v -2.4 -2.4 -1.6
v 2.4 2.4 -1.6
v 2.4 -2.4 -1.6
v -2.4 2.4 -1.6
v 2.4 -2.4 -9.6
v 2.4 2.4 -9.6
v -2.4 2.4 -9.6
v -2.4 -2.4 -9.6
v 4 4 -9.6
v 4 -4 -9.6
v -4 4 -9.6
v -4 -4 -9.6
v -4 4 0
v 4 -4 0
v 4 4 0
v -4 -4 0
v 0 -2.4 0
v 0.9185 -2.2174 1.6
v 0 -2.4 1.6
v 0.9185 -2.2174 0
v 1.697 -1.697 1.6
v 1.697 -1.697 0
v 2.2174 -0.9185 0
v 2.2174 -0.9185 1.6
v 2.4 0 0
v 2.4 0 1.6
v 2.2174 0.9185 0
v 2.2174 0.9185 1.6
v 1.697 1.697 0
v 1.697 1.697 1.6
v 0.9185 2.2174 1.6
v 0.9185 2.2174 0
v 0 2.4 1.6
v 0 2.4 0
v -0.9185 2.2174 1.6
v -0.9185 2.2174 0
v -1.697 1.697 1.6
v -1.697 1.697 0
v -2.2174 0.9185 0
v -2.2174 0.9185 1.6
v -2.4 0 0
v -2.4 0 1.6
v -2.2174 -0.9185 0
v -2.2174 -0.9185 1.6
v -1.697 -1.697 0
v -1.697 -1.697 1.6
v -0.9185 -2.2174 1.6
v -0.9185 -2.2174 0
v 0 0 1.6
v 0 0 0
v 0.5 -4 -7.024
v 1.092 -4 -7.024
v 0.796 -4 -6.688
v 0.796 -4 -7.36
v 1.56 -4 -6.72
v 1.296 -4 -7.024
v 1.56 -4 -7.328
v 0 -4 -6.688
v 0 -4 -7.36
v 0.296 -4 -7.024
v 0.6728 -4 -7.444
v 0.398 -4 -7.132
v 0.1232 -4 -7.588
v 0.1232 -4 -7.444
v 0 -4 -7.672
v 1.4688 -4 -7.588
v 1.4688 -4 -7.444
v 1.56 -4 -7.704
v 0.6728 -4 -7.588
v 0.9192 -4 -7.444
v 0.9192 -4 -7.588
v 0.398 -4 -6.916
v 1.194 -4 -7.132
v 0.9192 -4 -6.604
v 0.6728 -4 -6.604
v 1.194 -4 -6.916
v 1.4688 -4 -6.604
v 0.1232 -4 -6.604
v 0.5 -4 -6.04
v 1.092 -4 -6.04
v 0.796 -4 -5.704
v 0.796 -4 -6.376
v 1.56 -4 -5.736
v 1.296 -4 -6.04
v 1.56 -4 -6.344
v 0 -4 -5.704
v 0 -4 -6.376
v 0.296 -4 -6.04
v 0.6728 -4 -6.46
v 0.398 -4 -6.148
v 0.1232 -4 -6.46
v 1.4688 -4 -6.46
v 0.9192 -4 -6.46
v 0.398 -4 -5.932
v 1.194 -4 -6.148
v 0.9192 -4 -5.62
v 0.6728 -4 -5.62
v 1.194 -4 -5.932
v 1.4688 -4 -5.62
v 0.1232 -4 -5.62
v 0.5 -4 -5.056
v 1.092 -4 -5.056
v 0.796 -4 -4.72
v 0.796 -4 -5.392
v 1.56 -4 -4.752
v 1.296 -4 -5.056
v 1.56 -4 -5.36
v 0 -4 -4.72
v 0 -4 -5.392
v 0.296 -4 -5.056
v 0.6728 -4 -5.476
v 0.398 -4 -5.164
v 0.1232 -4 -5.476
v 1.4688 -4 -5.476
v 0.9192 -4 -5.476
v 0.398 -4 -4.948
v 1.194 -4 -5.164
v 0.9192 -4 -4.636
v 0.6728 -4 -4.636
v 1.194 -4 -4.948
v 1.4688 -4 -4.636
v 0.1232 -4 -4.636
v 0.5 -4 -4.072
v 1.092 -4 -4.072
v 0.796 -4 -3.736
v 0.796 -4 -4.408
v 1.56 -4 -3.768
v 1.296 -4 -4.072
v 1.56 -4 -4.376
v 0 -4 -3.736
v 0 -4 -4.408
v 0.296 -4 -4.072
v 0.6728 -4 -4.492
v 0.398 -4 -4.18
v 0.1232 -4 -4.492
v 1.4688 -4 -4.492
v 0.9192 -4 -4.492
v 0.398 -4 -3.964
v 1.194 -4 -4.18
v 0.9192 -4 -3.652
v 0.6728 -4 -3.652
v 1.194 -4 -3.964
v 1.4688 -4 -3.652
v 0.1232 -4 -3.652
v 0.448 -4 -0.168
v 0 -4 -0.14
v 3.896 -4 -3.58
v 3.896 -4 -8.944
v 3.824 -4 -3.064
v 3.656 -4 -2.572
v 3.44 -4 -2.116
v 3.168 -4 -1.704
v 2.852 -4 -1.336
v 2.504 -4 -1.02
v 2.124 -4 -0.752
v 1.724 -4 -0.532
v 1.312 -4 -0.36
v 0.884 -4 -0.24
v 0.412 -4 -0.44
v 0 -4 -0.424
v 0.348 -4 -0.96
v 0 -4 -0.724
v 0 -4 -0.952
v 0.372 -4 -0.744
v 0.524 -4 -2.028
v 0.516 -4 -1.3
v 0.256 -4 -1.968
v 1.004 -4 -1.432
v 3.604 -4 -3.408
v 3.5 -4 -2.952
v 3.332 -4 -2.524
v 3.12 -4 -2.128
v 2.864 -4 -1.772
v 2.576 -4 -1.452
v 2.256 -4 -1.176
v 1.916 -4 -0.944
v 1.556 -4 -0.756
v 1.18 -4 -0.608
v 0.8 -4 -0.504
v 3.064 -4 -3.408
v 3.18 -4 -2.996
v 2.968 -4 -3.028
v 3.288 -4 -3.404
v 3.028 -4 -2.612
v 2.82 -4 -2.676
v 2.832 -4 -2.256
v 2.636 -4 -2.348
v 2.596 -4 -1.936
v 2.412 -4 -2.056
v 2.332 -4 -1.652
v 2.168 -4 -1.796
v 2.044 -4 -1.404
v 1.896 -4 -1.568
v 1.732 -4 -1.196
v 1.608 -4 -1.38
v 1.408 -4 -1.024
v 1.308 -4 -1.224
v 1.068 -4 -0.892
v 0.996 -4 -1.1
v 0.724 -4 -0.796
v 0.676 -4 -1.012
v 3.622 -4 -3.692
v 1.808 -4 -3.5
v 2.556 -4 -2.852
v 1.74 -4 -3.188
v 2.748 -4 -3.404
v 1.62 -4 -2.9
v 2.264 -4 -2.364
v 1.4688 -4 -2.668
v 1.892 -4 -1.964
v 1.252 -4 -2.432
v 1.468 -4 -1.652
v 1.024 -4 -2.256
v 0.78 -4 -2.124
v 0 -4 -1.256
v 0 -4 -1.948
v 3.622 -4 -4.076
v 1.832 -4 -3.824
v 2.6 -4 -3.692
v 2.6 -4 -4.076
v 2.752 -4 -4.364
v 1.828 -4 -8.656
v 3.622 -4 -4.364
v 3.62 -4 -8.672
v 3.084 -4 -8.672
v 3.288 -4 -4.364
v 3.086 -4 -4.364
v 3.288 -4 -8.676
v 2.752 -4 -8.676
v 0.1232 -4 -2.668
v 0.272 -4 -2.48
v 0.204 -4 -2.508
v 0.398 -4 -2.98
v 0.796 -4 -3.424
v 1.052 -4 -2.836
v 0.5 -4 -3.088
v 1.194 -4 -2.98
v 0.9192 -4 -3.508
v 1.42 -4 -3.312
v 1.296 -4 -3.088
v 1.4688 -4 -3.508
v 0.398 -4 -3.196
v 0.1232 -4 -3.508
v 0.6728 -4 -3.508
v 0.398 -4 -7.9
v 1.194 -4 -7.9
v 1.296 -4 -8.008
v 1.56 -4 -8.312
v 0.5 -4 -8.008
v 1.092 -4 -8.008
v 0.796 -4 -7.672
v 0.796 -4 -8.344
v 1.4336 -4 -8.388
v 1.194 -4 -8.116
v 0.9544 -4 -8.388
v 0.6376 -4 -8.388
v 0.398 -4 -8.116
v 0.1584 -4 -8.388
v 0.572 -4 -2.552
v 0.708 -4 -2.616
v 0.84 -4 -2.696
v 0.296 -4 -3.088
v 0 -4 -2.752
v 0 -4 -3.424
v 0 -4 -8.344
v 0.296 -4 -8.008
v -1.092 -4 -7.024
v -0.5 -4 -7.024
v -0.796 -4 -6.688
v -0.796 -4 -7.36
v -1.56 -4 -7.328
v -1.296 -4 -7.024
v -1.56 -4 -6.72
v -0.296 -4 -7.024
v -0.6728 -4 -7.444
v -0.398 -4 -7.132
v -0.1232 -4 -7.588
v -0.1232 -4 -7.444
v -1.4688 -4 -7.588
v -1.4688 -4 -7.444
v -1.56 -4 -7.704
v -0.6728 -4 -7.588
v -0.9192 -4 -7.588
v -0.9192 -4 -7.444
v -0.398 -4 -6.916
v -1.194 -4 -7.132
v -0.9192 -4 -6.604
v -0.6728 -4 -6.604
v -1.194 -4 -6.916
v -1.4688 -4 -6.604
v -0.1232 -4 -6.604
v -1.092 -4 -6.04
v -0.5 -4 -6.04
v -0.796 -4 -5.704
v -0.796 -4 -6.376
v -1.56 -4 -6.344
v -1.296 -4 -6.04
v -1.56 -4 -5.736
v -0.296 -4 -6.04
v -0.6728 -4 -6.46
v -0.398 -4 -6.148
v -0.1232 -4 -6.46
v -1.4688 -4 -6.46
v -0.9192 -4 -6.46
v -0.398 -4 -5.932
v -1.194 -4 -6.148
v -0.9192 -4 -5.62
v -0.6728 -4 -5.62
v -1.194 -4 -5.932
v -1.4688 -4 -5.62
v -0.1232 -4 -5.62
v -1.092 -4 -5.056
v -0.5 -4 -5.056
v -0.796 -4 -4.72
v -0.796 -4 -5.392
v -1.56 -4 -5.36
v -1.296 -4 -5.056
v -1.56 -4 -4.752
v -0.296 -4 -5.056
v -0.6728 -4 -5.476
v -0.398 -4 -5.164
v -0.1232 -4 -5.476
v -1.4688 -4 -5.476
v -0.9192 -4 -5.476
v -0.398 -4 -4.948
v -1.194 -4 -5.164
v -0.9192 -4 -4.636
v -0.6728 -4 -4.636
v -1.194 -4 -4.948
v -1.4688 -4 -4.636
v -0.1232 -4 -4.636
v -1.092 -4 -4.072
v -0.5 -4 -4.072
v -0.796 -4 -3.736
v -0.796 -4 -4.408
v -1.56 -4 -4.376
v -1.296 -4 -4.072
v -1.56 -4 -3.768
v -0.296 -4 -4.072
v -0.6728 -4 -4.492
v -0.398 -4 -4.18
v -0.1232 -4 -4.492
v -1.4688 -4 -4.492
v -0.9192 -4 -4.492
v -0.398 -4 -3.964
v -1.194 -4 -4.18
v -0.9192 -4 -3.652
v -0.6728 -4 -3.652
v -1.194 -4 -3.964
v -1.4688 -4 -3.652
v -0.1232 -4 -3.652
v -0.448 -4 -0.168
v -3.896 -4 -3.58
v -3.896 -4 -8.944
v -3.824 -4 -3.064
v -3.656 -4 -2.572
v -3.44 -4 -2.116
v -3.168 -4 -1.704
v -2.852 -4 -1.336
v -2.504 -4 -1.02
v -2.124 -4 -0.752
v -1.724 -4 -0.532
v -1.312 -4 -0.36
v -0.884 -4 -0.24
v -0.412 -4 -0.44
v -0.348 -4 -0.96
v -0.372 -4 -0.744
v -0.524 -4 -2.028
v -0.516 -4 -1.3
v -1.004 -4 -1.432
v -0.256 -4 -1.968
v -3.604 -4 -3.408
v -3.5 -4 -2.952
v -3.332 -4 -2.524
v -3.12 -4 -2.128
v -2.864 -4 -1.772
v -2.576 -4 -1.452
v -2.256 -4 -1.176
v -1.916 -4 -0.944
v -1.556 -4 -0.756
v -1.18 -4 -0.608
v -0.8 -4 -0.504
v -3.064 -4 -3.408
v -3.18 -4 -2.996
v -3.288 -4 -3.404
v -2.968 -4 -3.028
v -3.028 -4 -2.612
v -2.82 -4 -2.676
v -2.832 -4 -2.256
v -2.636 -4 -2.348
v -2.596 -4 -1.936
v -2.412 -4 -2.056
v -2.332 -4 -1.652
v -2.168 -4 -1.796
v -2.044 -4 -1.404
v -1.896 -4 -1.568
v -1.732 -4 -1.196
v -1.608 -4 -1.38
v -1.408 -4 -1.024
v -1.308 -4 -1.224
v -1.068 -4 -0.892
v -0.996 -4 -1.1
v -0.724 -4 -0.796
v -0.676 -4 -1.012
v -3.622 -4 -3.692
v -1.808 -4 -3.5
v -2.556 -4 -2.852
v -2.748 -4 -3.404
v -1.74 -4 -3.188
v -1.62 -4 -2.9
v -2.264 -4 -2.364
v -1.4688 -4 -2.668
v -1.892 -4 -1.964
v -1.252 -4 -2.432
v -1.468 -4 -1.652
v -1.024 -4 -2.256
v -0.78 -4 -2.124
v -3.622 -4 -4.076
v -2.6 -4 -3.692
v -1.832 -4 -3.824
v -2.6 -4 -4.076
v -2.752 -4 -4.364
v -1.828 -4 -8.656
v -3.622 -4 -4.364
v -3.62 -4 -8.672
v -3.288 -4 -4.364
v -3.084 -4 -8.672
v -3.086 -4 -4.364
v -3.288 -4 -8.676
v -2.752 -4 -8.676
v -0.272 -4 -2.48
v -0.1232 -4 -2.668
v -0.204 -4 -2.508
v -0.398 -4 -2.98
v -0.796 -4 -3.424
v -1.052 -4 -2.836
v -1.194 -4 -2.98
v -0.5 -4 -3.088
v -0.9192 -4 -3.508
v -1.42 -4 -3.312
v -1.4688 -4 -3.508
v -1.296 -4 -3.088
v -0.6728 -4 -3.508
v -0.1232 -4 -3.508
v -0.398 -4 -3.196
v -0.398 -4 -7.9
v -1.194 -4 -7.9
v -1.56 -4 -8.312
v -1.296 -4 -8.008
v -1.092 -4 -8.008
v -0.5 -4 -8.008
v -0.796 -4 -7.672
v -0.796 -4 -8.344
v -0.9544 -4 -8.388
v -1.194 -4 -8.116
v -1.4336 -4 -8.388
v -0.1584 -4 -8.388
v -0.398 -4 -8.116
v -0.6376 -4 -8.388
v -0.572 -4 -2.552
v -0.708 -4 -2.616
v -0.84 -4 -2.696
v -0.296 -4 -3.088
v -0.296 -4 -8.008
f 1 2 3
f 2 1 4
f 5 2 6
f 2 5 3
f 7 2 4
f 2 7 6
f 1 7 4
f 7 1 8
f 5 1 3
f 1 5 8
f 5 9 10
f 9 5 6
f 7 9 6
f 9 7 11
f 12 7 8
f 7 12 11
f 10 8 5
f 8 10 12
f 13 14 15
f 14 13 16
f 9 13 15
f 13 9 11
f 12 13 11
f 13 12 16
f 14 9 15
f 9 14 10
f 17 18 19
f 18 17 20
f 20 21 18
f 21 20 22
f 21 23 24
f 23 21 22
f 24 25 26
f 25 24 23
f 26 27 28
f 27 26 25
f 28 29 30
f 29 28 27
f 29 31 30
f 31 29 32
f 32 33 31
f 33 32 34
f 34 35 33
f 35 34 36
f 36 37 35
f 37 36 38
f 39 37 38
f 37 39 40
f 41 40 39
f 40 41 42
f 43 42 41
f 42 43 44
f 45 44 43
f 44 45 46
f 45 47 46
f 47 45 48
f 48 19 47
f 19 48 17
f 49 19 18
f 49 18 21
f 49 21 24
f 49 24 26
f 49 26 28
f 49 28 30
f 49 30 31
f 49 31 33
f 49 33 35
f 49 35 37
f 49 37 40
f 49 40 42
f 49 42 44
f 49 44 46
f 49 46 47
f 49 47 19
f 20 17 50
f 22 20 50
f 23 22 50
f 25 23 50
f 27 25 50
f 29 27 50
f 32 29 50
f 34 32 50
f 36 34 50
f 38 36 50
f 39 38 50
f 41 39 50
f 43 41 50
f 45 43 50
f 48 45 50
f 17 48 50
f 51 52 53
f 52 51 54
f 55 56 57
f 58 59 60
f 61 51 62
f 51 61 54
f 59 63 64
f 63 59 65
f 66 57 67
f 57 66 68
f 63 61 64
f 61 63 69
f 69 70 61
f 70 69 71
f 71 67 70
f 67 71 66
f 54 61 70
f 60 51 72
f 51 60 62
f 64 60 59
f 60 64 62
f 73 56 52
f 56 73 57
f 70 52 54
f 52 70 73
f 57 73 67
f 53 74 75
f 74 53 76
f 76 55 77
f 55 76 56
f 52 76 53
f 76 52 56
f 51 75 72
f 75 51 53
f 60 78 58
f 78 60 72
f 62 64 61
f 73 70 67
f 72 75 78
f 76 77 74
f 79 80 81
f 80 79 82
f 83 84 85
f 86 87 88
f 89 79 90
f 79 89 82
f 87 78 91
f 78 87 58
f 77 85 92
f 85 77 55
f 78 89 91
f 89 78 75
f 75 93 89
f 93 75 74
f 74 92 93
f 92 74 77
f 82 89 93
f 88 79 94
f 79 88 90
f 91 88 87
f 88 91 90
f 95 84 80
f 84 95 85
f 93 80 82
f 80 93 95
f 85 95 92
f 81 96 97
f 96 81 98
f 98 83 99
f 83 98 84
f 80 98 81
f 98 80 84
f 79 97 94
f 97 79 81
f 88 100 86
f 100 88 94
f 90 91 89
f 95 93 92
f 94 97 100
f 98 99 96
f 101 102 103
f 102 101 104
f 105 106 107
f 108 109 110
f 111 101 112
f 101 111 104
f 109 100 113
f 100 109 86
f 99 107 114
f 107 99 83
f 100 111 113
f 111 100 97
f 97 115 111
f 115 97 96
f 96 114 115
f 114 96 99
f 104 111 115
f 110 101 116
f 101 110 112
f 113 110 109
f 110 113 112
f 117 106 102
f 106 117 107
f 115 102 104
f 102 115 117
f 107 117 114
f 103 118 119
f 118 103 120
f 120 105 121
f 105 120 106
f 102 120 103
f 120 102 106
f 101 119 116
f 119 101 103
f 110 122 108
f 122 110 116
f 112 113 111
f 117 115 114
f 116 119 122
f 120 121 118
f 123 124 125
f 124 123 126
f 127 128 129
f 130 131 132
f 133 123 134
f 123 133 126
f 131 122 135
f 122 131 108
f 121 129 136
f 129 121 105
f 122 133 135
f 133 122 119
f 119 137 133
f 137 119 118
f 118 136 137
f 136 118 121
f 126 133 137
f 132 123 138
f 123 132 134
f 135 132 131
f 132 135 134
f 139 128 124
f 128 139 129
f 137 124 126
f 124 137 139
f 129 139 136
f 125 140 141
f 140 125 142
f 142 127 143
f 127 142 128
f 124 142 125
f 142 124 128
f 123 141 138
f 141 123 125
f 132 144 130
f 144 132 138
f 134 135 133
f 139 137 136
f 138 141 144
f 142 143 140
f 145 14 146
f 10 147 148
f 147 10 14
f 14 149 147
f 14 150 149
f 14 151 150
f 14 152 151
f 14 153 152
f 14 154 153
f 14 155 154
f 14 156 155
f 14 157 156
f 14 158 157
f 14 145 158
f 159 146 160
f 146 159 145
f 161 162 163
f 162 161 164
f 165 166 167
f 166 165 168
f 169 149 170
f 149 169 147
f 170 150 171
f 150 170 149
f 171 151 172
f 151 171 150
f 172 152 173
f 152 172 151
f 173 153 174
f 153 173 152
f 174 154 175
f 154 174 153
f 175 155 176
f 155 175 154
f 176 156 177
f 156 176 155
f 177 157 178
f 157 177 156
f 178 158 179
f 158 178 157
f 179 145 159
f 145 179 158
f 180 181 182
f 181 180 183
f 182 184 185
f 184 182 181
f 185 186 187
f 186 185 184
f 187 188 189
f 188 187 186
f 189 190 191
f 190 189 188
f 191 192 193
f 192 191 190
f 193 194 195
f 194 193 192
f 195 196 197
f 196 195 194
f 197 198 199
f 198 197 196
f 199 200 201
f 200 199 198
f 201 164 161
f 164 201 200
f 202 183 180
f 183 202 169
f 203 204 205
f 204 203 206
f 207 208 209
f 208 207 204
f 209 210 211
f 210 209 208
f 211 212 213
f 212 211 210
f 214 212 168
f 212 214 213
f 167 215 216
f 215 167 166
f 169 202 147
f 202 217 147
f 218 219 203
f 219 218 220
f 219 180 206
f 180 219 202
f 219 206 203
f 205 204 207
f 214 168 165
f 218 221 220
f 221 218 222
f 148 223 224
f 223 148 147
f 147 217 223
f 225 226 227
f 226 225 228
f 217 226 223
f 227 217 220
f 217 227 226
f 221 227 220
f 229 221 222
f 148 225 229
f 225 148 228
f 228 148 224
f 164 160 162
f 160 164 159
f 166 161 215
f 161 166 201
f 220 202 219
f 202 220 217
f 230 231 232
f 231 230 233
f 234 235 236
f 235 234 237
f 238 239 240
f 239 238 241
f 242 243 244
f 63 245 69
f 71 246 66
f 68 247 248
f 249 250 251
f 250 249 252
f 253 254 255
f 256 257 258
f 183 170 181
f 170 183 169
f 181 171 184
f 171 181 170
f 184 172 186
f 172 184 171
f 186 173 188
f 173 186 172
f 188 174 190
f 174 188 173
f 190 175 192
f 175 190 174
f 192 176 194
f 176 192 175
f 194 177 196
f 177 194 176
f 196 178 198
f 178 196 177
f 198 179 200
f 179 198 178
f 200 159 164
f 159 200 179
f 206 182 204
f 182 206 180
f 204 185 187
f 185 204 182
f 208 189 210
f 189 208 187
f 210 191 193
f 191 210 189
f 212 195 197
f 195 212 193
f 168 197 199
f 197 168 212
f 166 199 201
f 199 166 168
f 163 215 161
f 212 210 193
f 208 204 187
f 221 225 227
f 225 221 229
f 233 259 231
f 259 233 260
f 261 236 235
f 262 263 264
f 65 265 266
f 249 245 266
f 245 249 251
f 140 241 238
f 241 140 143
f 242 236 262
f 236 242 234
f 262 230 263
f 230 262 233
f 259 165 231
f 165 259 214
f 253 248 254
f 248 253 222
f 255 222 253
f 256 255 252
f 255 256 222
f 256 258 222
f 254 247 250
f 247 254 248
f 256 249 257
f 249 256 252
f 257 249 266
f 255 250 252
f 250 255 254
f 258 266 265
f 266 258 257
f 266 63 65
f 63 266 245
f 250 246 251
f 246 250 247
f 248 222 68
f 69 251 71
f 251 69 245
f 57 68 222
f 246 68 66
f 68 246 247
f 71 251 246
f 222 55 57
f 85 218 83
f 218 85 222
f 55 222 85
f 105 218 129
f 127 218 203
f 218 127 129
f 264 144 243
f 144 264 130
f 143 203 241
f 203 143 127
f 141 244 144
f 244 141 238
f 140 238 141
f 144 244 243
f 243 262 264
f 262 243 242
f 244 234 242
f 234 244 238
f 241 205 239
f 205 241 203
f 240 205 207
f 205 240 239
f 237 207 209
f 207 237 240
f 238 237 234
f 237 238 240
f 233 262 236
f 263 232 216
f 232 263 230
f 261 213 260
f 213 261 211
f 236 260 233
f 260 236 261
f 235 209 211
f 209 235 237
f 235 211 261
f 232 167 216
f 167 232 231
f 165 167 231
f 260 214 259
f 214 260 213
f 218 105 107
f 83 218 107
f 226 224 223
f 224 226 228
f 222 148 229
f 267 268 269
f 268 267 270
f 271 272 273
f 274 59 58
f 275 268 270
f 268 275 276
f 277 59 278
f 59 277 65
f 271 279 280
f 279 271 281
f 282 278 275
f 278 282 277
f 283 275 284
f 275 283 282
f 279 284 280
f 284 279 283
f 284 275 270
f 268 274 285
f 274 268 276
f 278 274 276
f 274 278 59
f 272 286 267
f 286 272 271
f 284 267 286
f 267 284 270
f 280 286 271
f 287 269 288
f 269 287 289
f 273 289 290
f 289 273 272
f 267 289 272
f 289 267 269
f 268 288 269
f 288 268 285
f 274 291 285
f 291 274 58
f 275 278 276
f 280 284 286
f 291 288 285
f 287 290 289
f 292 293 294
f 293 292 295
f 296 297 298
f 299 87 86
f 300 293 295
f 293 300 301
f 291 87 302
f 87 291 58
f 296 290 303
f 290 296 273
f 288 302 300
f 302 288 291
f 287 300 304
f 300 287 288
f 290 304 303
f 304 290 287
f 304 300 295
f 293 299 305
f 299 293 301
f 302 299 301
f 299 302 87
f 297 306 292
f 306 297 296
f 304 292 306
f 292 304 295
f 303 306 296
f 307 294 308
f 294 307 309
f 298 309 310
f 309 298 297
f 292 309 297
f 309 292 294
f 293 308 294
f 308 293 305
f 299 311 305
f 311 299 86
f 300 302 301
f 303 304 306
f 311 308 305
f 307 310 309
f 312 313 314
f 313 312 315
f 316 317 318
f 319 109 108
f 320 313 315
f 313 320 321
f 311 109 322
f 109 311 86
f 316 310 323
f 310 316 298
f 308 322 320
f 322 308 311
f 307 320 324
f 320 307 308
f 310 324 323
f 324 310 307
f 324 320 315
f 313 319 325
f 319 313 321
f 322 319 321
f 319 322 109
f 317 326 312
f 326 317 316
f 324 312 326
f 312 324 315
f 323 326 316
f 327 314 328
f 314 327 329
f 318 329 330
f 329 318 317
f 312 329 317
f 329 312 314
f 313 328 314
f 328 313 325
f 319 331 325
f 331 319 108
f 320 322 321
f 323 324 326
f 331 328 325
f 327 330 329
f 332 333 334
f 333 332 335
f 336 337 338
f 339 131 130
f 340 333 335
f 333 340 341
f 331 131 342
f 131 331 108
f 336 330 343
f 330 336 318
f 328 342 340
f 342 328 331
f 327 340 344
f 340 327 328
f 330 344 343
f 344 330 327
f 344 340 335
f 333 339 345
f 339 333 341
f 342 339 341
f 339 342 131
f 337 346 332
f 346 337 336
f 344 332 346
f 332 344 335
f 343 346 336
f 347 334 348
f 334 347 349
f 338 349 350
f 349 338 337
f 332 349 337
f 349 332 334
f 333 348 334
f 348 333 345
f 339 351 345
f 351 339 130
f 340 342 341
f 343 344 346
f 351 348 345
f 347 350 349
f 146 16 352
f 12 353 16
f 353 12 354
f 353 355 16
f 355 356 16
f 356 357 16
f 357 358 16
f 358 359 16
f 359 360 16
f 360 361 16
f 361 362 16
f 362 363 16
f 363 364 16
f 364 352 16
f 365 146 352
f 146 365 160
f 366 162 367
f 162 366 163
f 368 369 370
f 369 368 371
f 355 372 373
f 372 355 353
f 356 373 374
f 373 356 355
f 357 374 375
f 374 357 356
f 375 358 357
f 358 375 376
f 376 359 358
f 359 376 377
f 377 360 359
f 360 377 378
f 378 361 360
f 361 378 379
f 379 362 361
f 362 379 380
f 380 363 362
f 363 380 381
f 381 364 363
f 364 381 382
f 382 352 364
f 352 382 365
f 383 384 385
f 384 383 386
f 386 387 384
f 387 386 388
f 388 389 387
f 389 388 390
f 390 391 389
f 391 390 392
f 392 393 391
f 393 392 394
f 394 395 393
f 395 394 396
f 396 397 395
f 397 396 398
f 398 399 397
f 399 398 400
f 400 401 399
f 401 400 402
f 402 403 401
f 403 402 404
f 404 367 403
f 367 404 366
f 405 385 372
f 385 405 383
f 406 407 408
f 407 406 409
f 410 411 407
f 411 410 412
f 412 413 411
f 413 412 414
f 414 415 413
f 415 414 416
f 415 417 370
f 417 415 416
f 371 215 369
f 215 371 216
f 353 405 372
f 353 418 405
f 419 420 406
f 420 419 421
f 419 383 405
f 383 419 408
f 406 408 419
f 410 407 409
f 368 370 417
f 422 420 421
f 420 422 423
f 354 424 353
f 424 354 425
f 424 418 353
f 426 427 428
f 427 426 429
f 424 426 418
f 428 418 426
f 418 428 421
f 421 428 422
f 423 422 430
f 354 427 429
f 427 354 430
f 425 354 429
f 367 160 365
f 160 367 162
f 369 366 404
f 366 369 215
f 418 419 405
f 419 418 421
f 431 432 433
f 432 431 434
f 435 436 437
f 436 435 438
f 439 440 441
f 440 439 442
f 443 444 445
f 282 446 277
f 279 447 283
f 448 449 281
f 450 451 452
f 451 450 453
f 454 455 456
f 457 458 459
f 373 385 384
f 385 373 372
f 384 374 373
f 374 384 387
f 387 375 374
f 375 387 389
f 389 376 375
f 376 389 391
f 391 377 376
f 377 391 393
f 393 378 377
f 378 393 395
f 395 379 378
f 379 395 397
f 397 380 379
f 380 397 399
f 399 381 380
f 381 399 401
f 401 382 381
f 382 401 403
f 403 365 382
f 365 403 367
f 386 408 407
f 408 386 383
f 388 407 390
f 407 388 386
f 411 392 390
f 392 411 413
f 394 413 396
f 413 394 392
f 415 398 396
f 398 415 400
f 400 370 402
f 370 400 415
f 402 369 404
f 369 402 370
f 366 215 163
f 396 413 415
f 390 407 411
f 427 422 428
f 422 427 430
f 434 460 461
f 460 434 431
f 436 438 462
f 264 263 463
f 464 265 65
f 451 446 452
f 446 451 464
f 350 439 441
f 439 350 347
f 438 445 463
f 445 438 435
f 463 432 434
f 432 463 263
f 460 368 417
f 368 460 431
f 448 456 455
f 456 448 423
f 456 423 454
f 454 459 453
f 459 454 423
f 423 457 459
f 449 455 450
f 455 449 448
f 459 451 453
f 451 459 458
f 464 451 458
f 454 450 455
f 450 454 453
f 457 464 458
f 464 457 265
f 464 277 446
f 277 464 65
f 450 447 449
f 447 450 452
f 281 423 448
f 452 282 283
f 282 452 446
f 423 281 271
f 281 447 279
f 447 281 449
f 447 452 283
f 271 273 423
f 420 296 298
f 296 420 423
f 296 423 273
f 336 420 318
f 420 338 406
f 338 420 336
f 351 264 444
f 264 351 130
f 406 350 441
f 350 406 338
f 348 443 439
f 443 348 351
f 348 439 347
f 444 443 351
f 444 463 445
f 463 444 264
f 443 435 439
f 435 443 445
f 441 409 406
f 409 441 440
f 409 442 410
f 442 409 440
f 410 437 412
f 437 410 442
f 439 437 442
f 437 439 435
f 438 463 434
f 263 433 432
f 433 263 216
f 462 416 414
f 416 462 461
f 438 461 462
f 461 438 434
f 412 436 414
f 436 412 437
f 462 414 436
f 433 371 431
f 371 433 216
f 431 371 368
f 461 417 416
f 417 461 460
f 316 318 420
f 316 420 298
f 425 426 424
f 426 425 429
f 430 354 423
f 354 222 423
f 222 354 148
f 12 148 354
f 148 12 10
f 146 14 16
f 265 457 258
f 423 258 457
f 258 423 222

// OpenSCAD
// file: ../p/4-4edge.scad
use <../lib.scad>
function ldraw_lib__4_4edge() = [
// 0 Circle 1.0
// 0 Name: 4-4edge.dat
// 0 Author: James Jessiman
// 0 !LDRAW_ORG Primitive UPDATE 2017-01
// 0 !LICENSE Licensed under CC BY 2.0 and CC BY 4.0 : see CAreadme.txt
// 
// 0 BFC CERTIFY CCW
  [0,"BFC","CERTIFY"],
  [0,"BFC","CCW"],
// 
// 0 !HISTORY 1998-12-15 [PTadmin] Official Update 1998-10
// 0 !HISTORY 2005-12-28 [PTadmin] Official Update 2005-01
// 0 !HISTORY 2007-06-24 [PTadmin] Header formatted for Contributor Agreement
// 0 !HISTORY 2008-07-01 [PTadmin] Official Update 2008-01
// 0 !HISTORY 2017-01-15 [Steffen] BFCed
// 0 !HISTORY 2017-12-30 [PTadmin] Official Update 2017-01
// 
// 
// 2 24 1 0 0 0.9239 0 0.3827
  [2,24,1,0,0,0.9239,0,0.3827],
// 2 24 0.9239 0 0.3827 0.7071 0 0.7071
  [2,24,0.9239,0,0.3827,0.7071,0,0.7071],
// 2 24 0.7071 0 0.7071 0.3827 0 0.9239
  [2,24,0.7071,0,0.7071,0.3827,0,0.9239],
// 2 24 0.3827 0 0.9239 0 0 1
  [2,24,0.3827,0,0.9239,0,0,1],
// 2 24 0 0 1 -0.3827 0 0.9239
  [2,24,0,0,1,-0.3827,0,0.9239],
// 2 24 -0.3827 0 0.9239 -0.7071 0 0.7071
  [2,24,-0.3827,0,0.9239,-0.7071,0,0.7071],
// 2 24 -0.7071 0 0.7071 -0.9239 0 0.3827
  [2,24,-0.7071,0,0.7071,-0.9239,0,0.3827],
// 2 24 -0.9239 0 0.3827 -1 0 -0
  [2,24,-0.9239,0,0.3827,-1,0,-0],
// 2 24 -1 0 -0 -0.9239 0 -0.3827
  [2,24,-1,0,-0,-0.9239,0,-0.3827],
// 2 24 -0.9239 0 -0.3827 -0.7071 0 -0.7071
  [2,24,-0.9239,0,-0.3827,-0.7071,0,-0.7071],
// 2 24 -0.7071 0 -0.7071 -0.3827 0 -0.9239
  [2,24,-0.7071,0,-0.7071,-0.3827,0,-0.9239],
// 2 24 -0.3827 0 -0.9239 0 0 -1
  [2,24,-0.3827,0,-0.9239,0,0,-1],
// 2 24 0 0 -1 0.3827 0 -0.9239
  [2,24,0,0,-1,0.3827,0,-0.9239],
// 2 24 0.3827 0 -0.9239 0.7071 0 -0.7071
  [2,24,0.3827,0,-0.9239,0.7071,0,-0.7071],
// 2 24 0.7071 0 -0.7071 0.9239 0 -0.3827
  [2,24,0.7071,0,-0.7071,0.9239,0,-0.3827],
// 2 24 0.9239 0 -0.3827 1 0 0
  [2,24,0.9239,0,-0.3827,1,0,0],
];
module ldraw_lib__4_4edge(step=0, col=false, unit=2/5, alt=false, line=0.2, solid=!$preview)
    makepoly(ldraw_lib__4_4edge(), step=step, col=col, unit=unit, alt=alt, line=line, solid=solid);
ldraw_lib__4_4edge(line=0.2);
// file: ../p/4-4disc.scad
use <../lib.scad>
function ldraw_lib__4_4disc() = [
// 0 Disc 1.0
// 0 Name: 4-4disc.dat
// 0 Author: James Jessiman
// 0 !LDRAW_ORG Primitive UPDATE 2002-02
// 0 !LICENSE Licensed under CC BY 2.0 and CC BY 4.0 : see CAreadme.txt
// 
// 0 BFC CERTIFY CCW
  [0,"BFC","CERTIFY"],
  [0,"BFC","CCW"],
// 
// 0 !HISTORY 1998-12-15 [PTadmin] Official Update 1998-10
// 0 !HISTORY 2002-03-23 [sbliss] Added BFC statement
// 0 !HISTORY 2002-04-25 [PTadmin] Official Update 2002-02
// 0 !HISTORY 2007-06-24 [PTadmin] Header formatted for Contributor Agreement
// 0 !HISTORY 2008-07-01 [PTadmin] Official Update 2008-01
// 
// 
// 3 16 0 0 0 1 0 0 0.9239 0 0.3827
  [3,16,0,0,0,1,0,0,0.9239,0,0.3827],
// 3 16 0 0 0 0.9239 0 0.3827 0.7071 0 0.7071
  [3,16,0,0,0,0.9239,0,0.3827,0.7071,0,0.7071],
// 3 16 0 0 0 0.7071 0 0.7071 0.3827 0 0.9239
  [3,16,0,0,0,0.7071,0,0.7071,0.3827,0,0.9239],
// 3 16 0 0 0 0.3827 0 0.9239 0 0 1
  [3,16,0,0,0,0.3827,0,0.9239,0,0,1],
// 3 16 0 0 0 0 0 1 -0.3827 0 0.9239
  [3,16,0,0,0,0,0,1,-0.3827,0,0.9239],
// 3 16 0 0 0 -0.3827 0 0.9239 -0.7071 0 0.7071
  [3,16,0,0,0,-0.3827,0,0.9239,-0.7071,0,0.7071],
// 3 16 0 0 0 -0.7071 0 0.7071 -0.9239 0 0.3827
  [3,16,0,0,0,-0.7071,0,0.7071,-0.9239,0,0.3827],
// 3 16 0 0 0 -0.9239 0 0.3827 -1 0 -0
  [3,16,0,0,0,-0.9239,0,0.3827,-1,0,-0],
// 3 16 0 0 0 -1 0 -0 -0.9239 0 -0.3827
  [3,16,0,0,0,-1,0,-0,-0.9239,0,-0.3827],
// 3 16 0 0 0 -0.9239 0 -0.3827 -0.7071 0 -0.7071
  [3,16,0,0,0,-0.9239,0,-0.3827,-0.7071,0,-0.7071],
// 3 16 0 0 0 -0.7071 0 -0.7071 -0.3827 0 -0.9239
  [3,16,0,0,0,-0.7071,0,-0.7071,-0.3827,0,-0.9239],
// 3 16 0 0 0 -0.3827 0 -0.9239 0 0 -1
  [3,16,0,0,0,-0.3827,0,-0.9239,0,0,-1],
// 3 16 0 0 0 0 0 -1 0.3827 0 -0.9239
  [3,16,0,0,0,0,0,-1,0.3827,0,-0.9239],
// 3 16 0 0 0 0.3827 0 -0.9239 0.7071 0 -0.7071
  [3,16,0,0,0,0.3827,0,-0.9239,0.7071,0,-0.7071],
// 3 16 0 0 0 0.7071 0 -0.7071 0.9239 0 -0.3827
  [3,16,0,0,0,0.7071,0,-0.7071,0.9239,0,-0.3827],
// 3 16 0 0 0 0.9239 0 -0.3827 1 0 0
  [3,16,0,0,0,0.9239,0,-0.3827,1,0,0],
// 0
];
module ldraw_lib__4_4disc(step=0, col=false, unit=2/5, alt=false, line=0.2, solid=!$preview)
    makepoly(ldraw_lib__4_4disc(), step=step, col=col, unit=unit, alt=alt, line=line, solid=solid);
ldraw_lib__4_4disc(line=0.2);
// file: ../p/4-4cyli.scad
use <../lib.scad>
$fa=1; $fs=0.2;
function ldraw_lib__4_4cyli(realsolid=false) = [
// 0 Cylinder 1.0
// 0 Name: 4-4cyli.dat
// 0 Author: James Jessiman
// 0 !LDRAW_ORG Primitive UPDATE 2005-01
// 0 !LICENSE Licensed under CC BY 2.0 and CC BY 4.0 : see CAreadme.txt
// 
// 0 BFC CERTIFY CCW
  [0,"BFC","CERTIFY"],
  [0,"BFC","CCW"],
// 
// 0 !HISTORY 1998-12-15 [PTadmin] Official Update 1998-10
// 0 !HISTORY 2002-03-23 [sbliss] Added BFC statement; merged headers from files in distributions LDraw 0.27 and Complete.
// 0 !HISTORY 2002-04-25 [PTadmin] Official Update 2002-02
// 0 !HISTORY 2004-12-14 [guyvivan] BFC CCW
// 0 !HISTORY 2005-12-28 [PTadmin] Official Update 2005-01
// 0 !HISTORY 2007-06-24 [PTadmin] Header formatted for Contributor Agreement
// 0 !HISTORY 2008-07-01 [PTadmin] Official Update 2008-01
// 
// 
// 4 16 1 1 0 0.9239 1 0.3827 0.9239 0 0.3827 1 0 0
  [4,16,1,1,0,0.9239,1,0.3827,0.9239,0,0.3827,1,0,0],
// 5 24 1 0 0 1 1 0 0.9239 0 0.3827 0.9239 0 -0.3827
  [5,24,1,0,0,1,1,0,0.9239,0,0.3827,0.9239,0,-0.3827],
// 4 16 0.9239 1 0.3827 0.7071 1 0.7071 0.7071 0 0.7071 0.9239 0 0.3827
  [4,16,0.9239,1,0.3827,0.7071,1,0.7071,0.7071,0,0.7071,0.9239,0,0.3827],
// 5 24 0.9239 0 0.3827 0.9239 1 0.3827 0.7071 0 0.7071 1 0 0
  [5,24,0.9239,0,0.3827,0.9239,1,0.3827,0.7071,0,0.7071,1,0,0],
// 4 16 0.7071 1 0.7071 0.3827 1 0.9239 0.3827 0 0.9239 0.7071 0 0.7071
  [4,16,0.7071,1,0.7071,0.3827,1,0.9239,0.3827,0,0.9239,0.7071,0,0.7071],
// 5 24 0.7071 0 0.7071 0.7071 1 0.7071 0.3827 0 0.9239 0.9239 0 0.3827
  [5,24,0.7071,0,0.7071,0.7071,1,0.7071,0.3827,0,0.9239,0.9239,0,0.3827],
// 4 16 0.3827 1 0.9239 0 1 1 0 0 1 0.3827 0 0.9239
  [4,16,0.3827,1,0.9239,0,1,1,0,0,1,0.3827,0,0.9239],
// 5 24 0.3827 0 0.9239 0.3827 1 0.9239 0 0 1 0.7071 0 0.7071
  [5,24,0.3827,0,0.9239,0.3827,1,0.9239,0,0,1,0.7071,0,0.7071],
// 4 16 0 1 1 -0.3827 1 0.9239 -0.3827 0 0.9239 0 0 1
  [4,16,0,1,1,-0.3827,1,0.9239,-0.3827,0,0.9239,0,0,1],
// 5 24 0 0 1 0 1 1 -0.3827 0 0.9239 0.3827 0 0.9239
  [5,24,0,0,1,0,1,1,-0.3827,0,0.9239,0.3827,0,0.9239],
// 4 16 -0.3827 1 0.9239 -0.7071 1 0.7071 -0.7071 0 0.7071 -0.3827 0 0.9239
  [4,16,-0.3827,1,0.9239,-0.7071,1,0.7071,-0.7071,0,0.7071,-0.3827,0,0.9239],
// 5 24 -0.3827 0 0.9239 -0.3827 1 0.9239 -0.7071 0 0.7071 0 0 1
  [5,24,-0.3827,0,0.9239,-0.3827,1,0.9239,-0.7071,0,0.7071,0,0,1],
// 4 16 -0.7071 1 0.7071 -0.9239 1 0.3827 -0.9239 0 0.3827 -0.7071 0 0.7071
  [4,16,-0.7071,1,0.7071,-0.9239,1,0.3827,-0.9239,0,0.3827,-0.7071,0,0.7071],
// 5 24 -0.7071 0 0.7071 -0.7071 1 0.7071 -0.9239 0 0.3827 -0.3827 0 0.9239
  [5,24,-0.7071,0,0.7071,-0.7071,1,0.7071,-0.9239,0,0.3827,-0.3827,0,0.9239],
// 4 16 -0.9239 1 0.3827 -1 1 0 -1 0 0 -0.9239 0 0.3827
  [4,16,-0.9239,1,0.3827,-1,1,0,-1,0,0,-0.9239,0,0.3827],
// 5 24 -0.9239 0 0.3827 -0.9239 1 0.3827 -1 0 0 -0.7071 0 0.7071
  [5,24,-0.9239,0,0.3827,-0.9239,1,0.3827,-1,0,0,-0.7071,0,0.7071],
// 4 16 -1 1 0 -0.9239 1 -0.3827 -0.9239 0 -0.3827 -1 0 0
  [4,16,-1,1,0,-0.9239,1,-0.3827,-0.9239,0,-0.3827,-1,0,0],
// 5 24 -1 0 0 -1 1 0 -0.9239 0 -0.3827 -0.9239 0 0.3827
  [5,24,-1,0,0,-1,1,0,-0.9239,0,-0.3827,-0.9239,0,0.3827],
// 4 16 -0.9239 1 -0.3827 -0.7071 1 -0.7071 -0.7071 0 -0.7071 -0.9239 0 -0.3827
  [4,16,-0.9239,1,-0.3827,-0.7071,1,-0.7071,-0.7071,0,-0.7071,-0.9239,0,-0.3827],
// 5 24 -0.9239 0 -0.3827 -0.9239 1 -0.3827 -0.7071 0 -0.7071 -1 0 0
  [5,24,-0.9239,0,-0.3827,-0.9239,1,-0.3827,-0.7071,0,-0.7071,-1,0,0],
// 4 16 -0.7071 1 -0.7071 -0.3827 1 -0.9239 -0.3827 0 -0.9239 -0.7071 0 -0.7071
  [4,16,-0.7071,1,-0.7071,-0.3827,1,-0.9239,-0.3827,0,-0.9239,-0.7071,0,-0.7071],
// 5 24 -0.7071 0 -0.7071 -0.7071 1 -0.7071 -0.3827 0 -0.9239 -0.9239 0 -0.3827
  [5,24,-0.7071,0,-0.7071,-0.7071,1,-0.7071,-0.3827,0,-0.9239,-0.9239,0,-0.3827],
// 4 16 -0.3827 1 -0.9239 0 1 -1 0 0 -1 -0.3827 0 -0.9239
  [4,16,-0.3827,1,-0.9239,0,1,-1,0,0,-1,-0.3827,0,-0.9239],
// 5 24 -0.3827 0 -0.9239 -0.3827 1 -0.9239 0 0 -1 -0.7071 0 -0.7071
  [5,24,-0.3827,0,-0.9239,-0.3827,1,-0.9239,0,0,-1,-0.7071,0,-0.7071],
// 4 16 0 1 -1 0.3827 1 -0.9239 0.3827 0 -0.9239 0 0 -1
  [4,16,0,1,-1,0.3827,1,-0.9239,0.3827,0,-0.9239,0,0,-1],
// 5 24 0 0 -1 0 1 -1 0.3827 0 -0.9239 -0.3827 0 -0.9239
  [5,24,0,0,-1,0,1,-1,0.3827,0,-0.9239,-0.3827,0,-0.9239],
// 4 16 0.3827 1 -0.9239 0.7071 1 -0.7071 0.7071 0 -0.7071 0.3827 0 -0.9239
  [4,16,0.3827,1,-0.9239,0.7071,1,-0.7071,0.7071,0,-0.7071,0.3827,0,-0.9239],
// 5 24 0.3827 0 -0.9239 0.3827 1 -0.9239 0.7071 0 -0.7071 0 0 -1
  [5,24,0.3827,0,-0.9239,0.3827,1,-0.9239,0.7071,0,-0.7071,0,0,-1],
// 4 16 0.7071 1 -0.7071 0.9239 1 -0.3827 0.9239 0 -0.3827 0.7071 0 -0.7071
  [4,16,0.7071,1,-0.7071,0.9239,1,-0.3827,0.9239,0,-0.3827,0.7071,0,-0.7071],
// 5 24 0.7071 0 -0.7071 0.7071 1 -0.7071 0.9239 0 -0.3827 0.3827 0 -0.9239
  [5,24,0.7071,0,-0.7071,0.7071,1,-0.7071,0.9239,0,-0.3827,0.3827,0,-0.9239],
// 4 16 0.9239 1 -0.3827 1 1 0 1 0 0 0.9239 0 -0.3827
  [4,16,0.9239,1,-0.3827,1,1,0,1,0,0,0.9239,0,-0.3827],
// 5 24 0.9239 0 -0.3827 0.9239 1 -0.3827 1 0 0 0.7071 0 -0.7071
  [5,24,0.9239,0,-0.3827,0.9239,1,-0.3827,1,0,0,0.7071,0,-0.7071],
// 0
];
module ldraw_lib__4_4cyli(step=0, col=false, unit=2/5, alt=false, line=0.2, solid=!$preview)
    makepoly(ldraw_lib__4_4cyli(solid), step=step, col=col, unit=unit, alt=alt, line=line, solid=solid);
ldraw_lib__4_4cyli(line=0.2);
// file: ../p/stud.scad
use <../lib.scad>
use <4-4cyli.scad>
use <4-4disc.scad>
use <4-4edge.scad>
function ldraw_lib__stud() = [
// 0 Stud
// 0 Name: stud.dat
// 0 Author: James Jessiman
// 0 !LDRAW_ORG Primitive UPDATE 2012-01
// 0 !LICENSE Licensed under CC BY 4.0 : see CAreadme.txt
// 
// 0 BFC CERTIFY CCW
  [0,"BFC","CERTIFY"],
  [0,"BFC","CCW"],
// 
// 0 !HISTORY 2002-04-04 [sbliss] Modified for BFC compliance
// 0 !HISTORY 2002-04-25 [PTadmin] Official Update 2002-02
// 0 !HISTORY 2007-06-24 [PTadmin] Header formatted for Contributor Agreement
// 0 !HISTORY 2008-07-01 [PTadmin] Official Update 2008-01
// 0 !HISTORY 2012-02-16 [Philo] Changed to CCW
// 0 !HISTORY 2012-03-30 [PTadmin] Official Update 2012-01
// 
// 
// 1 16 0 0 0 6 0 0 0 1 0 0 0 6 4-4edge.dat
  [1,16,0,0,0,6,0,0,0,1,0,0,0,6, ldraw_lib__4_4edge()],
// 1 16 0 -4 0 6 0 0 0 1 0 0 0 6 4-4edge.dat
  [1,16,0,-4,0,6,0,0,0,1,0,0,0,6, ldraw_lib__4_4edge()],
// 1 16 0 0 0 6 0 0 0 -4 0 0 0 6 4-4cyli.dat
  [1,16,0,0,0,6,0,0,0,-4,0,0,0,6, ldraw_lib__4_4cyli()],
// 1 16 0 -4 0 6 0 0 0 1 0 0 0 6 4-4disc.dat
  [1,16,0,-4,0,6,0,0,0,1,0,0,0,6, ldraw_lib__4_4disc()],
  [-1,16,0,0,0,6,0,0,0,-1,0,0,0,6, ldraw_lib__4_4disc()],
];
module ldraw_lib__stud(step=0, col=false, unit=2/5, alt=false, line=0.2, solid=!$preview)
    makepoly(ldraw_lib__stud(), step=step, col=col, unit=unit, alt=alt, line=line, solid=solid);
ldraw_lib__stud(line=0.2);
// file: ../p/box5.scad
use <../lib.scad>
function ldraw_lib__box5() = [
// 0 Box with 5 Faces and All Edges
// 0 Name: box5.dat
// 0 Author: James Jessiman
// 0 !LDRAW_ORG Primitive UPDATE 2012-01
// 0 !LICENSE Licensed under CC BY 2.0 and CC BY 4.0 : see CAreadme.txt
// 
// 0 BFC CERTIFY CCW
  [0,"BFC","CERTIFY"],
  [0,"BFC","CCW"],
// 
// 0 !HISTORY 2002-04-03 [sbliss] Modified for BFC compliance
// 0 !HISTORY 2002-04-25 [PTadmin] Official Update 2002-02
// 0 !HISTORY 2007-06-24 [PTadmin] Header formatted for Contributor Agreement
// 0 !HISTORY 2008-07-01 [PTadmin] Official Update 2008-01
// 0 !HISTORY 2012-02-16 [Philo] Changed to CCW
// 0 !HISTORY 2012-03-30 [PTadmin] Official Update 2012-01
// 
// 
// 2 24 1 1 1 -1 1 1
  [2,24,1,1,1,-1,1,1],
// 2 24 -1 1 1 -1 1 -1
  [2,24,-1,1,1,-1,1,-1],
// 2 24 -1 1 -1 1 1 -1
  [2,24,-1,1,-1,1,1,-1],
// 2 24 1 1 -1 1 1 1
  [2,24,1,1,-1,1,1,1],
// 2 24 1 0 1 -1 0 1
  [2,24,1,0,1,-1,0,1],
// 2 24 -1 0 1 -1 0 -1
  [2,24,-1,0,1,-1,0,-1],
// 2 24 -1 0 -1 1 0 -1
  [2,24,-1,0,-1,1,0,-1],
// 2 24 1 0 -1 1 0 1
  [2,24,1,0,-1,1,0,1],
// 2 24 1 0 1 1 1 1
  [2,24,1,0,1,1,1,1],
// 2 24 -1 0 1 -1 1 1
  [2,24,-1,0,1,-1,1,1],
// 2 24 1 0 -1 1 1 -1
  [2,24,1,0,-1,1,1,-1],
// 2 24 -1 0 -1 -1 1 -1
  [2,24,-1,0,-1,-1,1,-1],
// 4 16 -1 1 1 1 1 1 1 1 -1 -1 1 -1
  [4,16,-1,1,1,1,1,1,1,1,-1,-1,1,-1],
// 4 16 -1 1 1 -1 0 1 1 0 1 1 1 1
  [4,16,-1,1,1,-1,0,1,1,0,1,1,1,1],
// 4 16 -1 1 -1 -1 0 -1 -1 0 1 -1 1 1
  [4,16,-1,1,-1,-1,0,-1,-1,0,1,-1,1,1],
// 4 16 1 1 -1 1 0 -1 -1 0 -1 -1 1 -1
  [4,16,1,1,-1,1,0,-1,-1,0,-1,-1,1,-1],
// 4 16 1 1 1 1 0 1 1 0 -1 1 1 -1
  [4,16,1,1,1,1,0,1,1,0,-1,1,1,-1],
];
makepoly(ldraw_lib__box5(), line=0.2);
// file: ../p/box4t.scad
use <../lib.scad>
function ldraw_lib__box4t() = [
// 0 Box with 4 Adjacent Faces and All Edges
// 0 Name: box4t.dat
// 0 Author: Tore Eriksson [Tore_Eriksson]
// 0 !LDRAW_ORG Primitive UPDATE 2003-02
// 0 !LICENSE Licensed under CC BY 2.0 and CC BY 4.0 : see CAreadme.txt
// 
// 0 BFC CERTIFY CCW
  [0,"BFC","CERTIFY"],
  [0,"BFC","CCW"],
// 
// 0 !HISTORY 1997-09-29 [PTadmin] Official Update 1997-15
// 0 !HISTORY 2002-08-31 [izanette] Modified with WINDZ for BFC compliance
// 0 !HISTORY 2003-08-01 [PTadmin] Official Update 2003-02
// 0 !HISTORY 2007-06-24 [PTadmin] Header formatted for Contributor Agreement
// 0 !HISTORY 2008-07-01 [PTadmin] Official Update 2008-01
// 
// 
// 2 24 1 1 1 -1 1 1
  [2,24,1,1,1,-1,1,1],
// 2 24 -1 1 1 -1 1 -1
  [2,24,-1,1,1,-1,1,-1],
// 2 24 -1 1 -1 1 1 -1
  [2,24,-1,1,-1,1,1,-1],
// 2 24 1 1 -1 1 1 1
  [2,24,1,1,-1,1,1,1],
// 2 24 1 0 1 -1 0 1
  [2,24,1,0,1,-1,0,1],
// 2 24 -1 0 1 -1 0 -1
  [2,24,-1,0,1,-1,0,-1],
// 2 24 -1 0 -1 1 0 -1
  [2,24,-1,0,-1,1,0,-1],
// 2 24 1 0 -1 1 0 1
  [2,24,1,0,-1,1,0,1],
// 2 24 1 0 1 1 1 1
  [2,24,1,0,1,1,1,1],
// 2 24 -1 0 1 -1 1 1
  [2,24,-1,0,1,-1,1,1],
// 2 24 1 0 -1 1 1 -1
  [2,24,1,0,-1,1,1,-1],
// 2 24 -1 0 -1 -1 1 -1
  [2,24,-1,0,-1,-1,1,-1],
// 4 16 1 1 1 1 1 -1 -1 1 -1 -1 1 1
  [4,16,1,1,1,1,1,-1,-1,1,-1,-1,1,1],
// 4 16 1 1 1 -1 1 1 -1 0 1 1 0 1
  [4,16,1,1,1,-1,1,1,-1,0,1,1,0,1],
// 4 16 -1 1 1 -1 1 -1 -1 0 -1 -1 0 1
  [4,16,-1,1,1,-1,1,-1,-1,0,-1,-1,0,1],
// 0 4 16 -1 1 -1 -1 0 -1 1 0 -1 1 1 -1
// 4 16 1 1 -1 1 1 1 1 0 1 1 0 -1
  [4,16,1,1,-1,1,1,1,1,0,1,1,0,-1],
// 0
];
makepoly(ldraw_lib__box4t(), line=0.2);
// file: s/3005p07s02.scad
use <../../lib.scad>
function ldraw_lib__s__3005p07s02() = [
// 0 ~Brick  1 x  1 Silver Window with Dark Brown Lattice Pattern
// 0 Name: s\3005p07s02.dat
// 0 Author: Philippe Hurbain [Philo]
// 0 !LDRAW_ORG Subpart UPDATE 2025-07
// 0 !LICENSE Licensed under CC BY 4.0 : see CAreadme.txt
// 
// 0 BFC CERTIFY CCW
  [0,"BFC","CERTIFY"],
  [0,"BFC","CCW"],
// 
// 0 !HISTORY 2025-07-27 [OrionP] Official Update 2025-07
// 
// 4 80 2.73 17.56 -10 1.99 16.72 -10 1.25 17.56 -10 1.99 18.4 -10
  [4,80,2.73,17.56,-10,1.99,16.72,-10,1.25,17.56,-10,1.99,18.4,-10],
// 3 80 3.9 16.8 -10 3.24 17.56 -10 3.9 18.32 -10
  [3,80,3.9,16.8,-10,3.24,17.56,-10,3.9,18.32,-10],
// 3 80 0 16.72 -10 0 18.4 -10 0.74 17.56 -10
  [3,80,0,16.72,-10,0,18.4,-10,0.74,17.56,-10],
// 4 308 1.99 18.4 -10 1.25 17.56 -10 0.995 17.83 -10 1.6821 18.61 -10
  [4,308,1.99,18.4,-10,1.25,17.56,-10,0.995,17.83,-10,1.6821,18.61,-10],
// 4 308 0 18.4 -10 0 19.18 -10 0.3079 18.97 -10 0.3079 18.61 -10
  [4,308,0,18.4,-10,0,19.18,-10,0.3079,18.97,-10,0.3079,18.61,-10],
// 4 308 3.6721 18.97 -10 3.9 19.26 -10 3.9 18.32 -10 3.6721 18.61 -10
  [4,308,3.6721,18.97,-10,3.9,19.26,-10,3.9,18.32,-10,3.6721,18.61,-10],
// 4 308 0.3079 18.97 -10 1.6821 18.97 -10 1.6821 18.61 -10 0.3079 18.61 -10
  [4,308,0.3079,18.97,-10,1.6821,18.97,-10,1.6821,18.61,-10,0.3079,18.61,-10],
// 4 308 1.6821 18.61 -10 1.6821 18.97 -10 2.2979 18.97 -10 2.2979 18.61 -10
  [4,308,1.6821,18.61,-10,1.6821,18.97,-10,2.2979,18.97,-10,2.2979,18.61,-10],
// 4 308 2.2979 18.61 -10 2.2979 18.97 -10 3.6721 18.97 -10 3.6721 18.61 -10
  [4,308,2.2979,18.61,-10,2.2979,18.97,-10,3.6721,18.97,-10,3.6721,18.61,-10],
// 3 308 1.99 18.4 -10 1.6821 18.61 -10 2.2979 18.61 -10
  [3,308,1.99,18.4,-10,1.6821,18.61,-10,2.2979,18.61,-10],
// 4 308 0.995 17.83 -10 1.25 17.56 -10 0.995 17.29 -10 0.74 17.56 -10
  [4,308,0.995,17.83,-10,1.25,17.56,-10,0.995,17.29,-10,0.74,17.56,-10],
// 4 308 0.995 17.83 -10 0.74 17.56 -10 0 18.4 -10 0.3079 18.61 -10
  [4,308,0.995,17.83,-10,0.74,17.56,-10,0,18.4,-10,0.3079,18.61,-10],
// 4 308 3.24 17.56 -10 2.73 17.56 -10 2.985 17.83 -10 3.9 18.32 -10
  [4,308,3.24,17.56,-10,2.73,17.56,-10,2.985,17.83,-10,3.9,18.32,-10],
// 4 308 2.73 17.56 -10 1.99 18.4 -10 2.2979 18.61 -10 2.985 17.83 -10
  [4,308,2.73,17.56,-10,1.99,18.4,-10,2.2979,18.61,-10,2.985,17.83,-10],
// 3 308 3.9 18.32 -10 2.985 17.83 -10 3.6721 18.61 -10
  [3,308,3.9,18.32,-10,2.985,17.83,-10,3.6721,18.61,-10],
// 4 308 1.99 16.72 -10 2.985 17.29 -10 2.2979 16.51 -10 1.6821 16.51 -10
  [4,308,1.99,16.72,-10,2.985,17.29,-10,2.2979,16.51,-10,1.6821,16.51,-10],
// 4 308 3.9 16.8 -10 3.6721 16.51 -10 2.985 17.29 -10 3.24 17.56 -10
  [4,308,3.9,16.8,-10,3.6721,16.51,-10,2.985,17.29,-10,3.24,17.56,-10],
// 4 308 2.73 17.56 -10 3.24 17.56 -10 2.985 17.29 -10 1.99 16.72 -10
  [4,308,2.73,17.56,-10,3.24,17.56,-10,2.985,17.29,-10,1.99,16.72,-10],
// 4 308 0.995 17.29 -10 1.25 17.56 -10 1.99 16.72 -10 1.6821 16.51 -10
  [4,308,0.995,17.29,-10,1.25,17.56,-10,1.99,16.72,-10,1.6821,16.51,-10],
// 4 308 0.74 17.56 -10 0.995 17.29 -10 0.3079 16.51 -10 0 16.72 -10
  [4,308,0.74,17.56,-10,0.995,17.29,-10,0.3079,16.51,-10,0,16.72,-10],
// 3 80 0.995 17.83 -10 0.3079 18.61 -10 1.6821 18.61 -10
  [3,80,0.995,17.83,-10,0.3079,18.61,-10,1.6821,18.61,-10],
// 3 80 2.985 17.83 -10 2.2979 18.61 -10 3.6721 18.61 -10
  [3,80,2.985,17.83,-10,2.2979,18.61,-10,3.6721,18.61,-10],
// 3 80 0.995 17.29 -10 1.6821 16.51 -10 0.3079 16.51 -10
  [3,80,0.995,17.29,-10,1.6821,16.51,-10,0.3079,16.51,-10],
// 3 80 2.985 17.29 -10 3.6721 16.51 -10 2.2979 16.51 -10
  [3,80,2.985,17.29,-10,3.6721,16.51,-10,2.2979,16.51,-10],
];
module ldraw_lib__s__3005p07s02(step=0, col=false, unit=2/5, alt=false, line=0.2, solid=!$preview)
    makepoly(ldraw_lib__s__3005p07s02(), step=step, col=col, unit=unit, alt=alt, line=line, solid=solid);
ldraw_lib__s__3005p07s02(line=0.2);
// file: s/3005s01.scad
use <../../lib.scad>
use <../../p/box4t.scad>
use <../../p/box5.scad>
use <../../p/stud.scad>
function ldraw_lib__s__3005s01() = [
// 0 ~Brick  1 x  1 without Front Face
// 0 Name: s\3005s01.dat
// 0 Author: John Riley [jriley]
// 0 !LDRAW_ORG Subpart UPDATE 2004-01
// 0 !LICENSE Licensed under CC BY 2.0 and CC BY 4.0 : see CAreadme.txt
// 
// 0 BFC CERTIFY CCW
  [0,"BFC","CERTIFY"],
  [0,"BFC","CCW"],
// 
// 0 !HISTORY 2003-09-07 [jriley] BFCed & Subfiled
// 0 !HISTORY 2004-03-02 [PTadmin] Official Update 2004-01
// 0 !HISTORY 2007-08-29 [PTadmin] Header formatted for Contributor Agreement
// 0 !HISTORY 2008-07-01 [PTadmin] Official Update 2008-01
// 
// 
// 0 BFC INVERTNEXT
  [0,"BFC","INVERTNEXT"],
// 1 16 0 24 0 0 0 6 0 -20 0 -6 0 0 box5.dat
  [1,16,0,24,0,0,0,6,0,-20,0,-6,0,0, ldraw_lib__box5()],
// 4 16 10 24 -10 6 24 -6 6 24 6 10 24 10
  [4,16,10,24,-10,6,24,-6,6,24,6,10,24,10],
// 4 16 10 24 10 6 24 6 -6 24 6 -10 24 10
  [4,16,10,24,10,6,24,6,-6,24,6,-10,24,10],
// 4 16 -10 24 10 -6 24 6 -6 24 -6 -10 24 -10
  [4,16,-10,24,10,-6,24,6,-6,24,-6,-10,24,-10],
// 4 16 -10 24 -10 -6 24 -6 6 24 -6 10 24 -10
  [4,16,-10,24,-10,-6,24,-6,6,24,-6,10,24,-10],
// 1 16 0 24 0 10 0 0 0 -24 0 0 0 10 box4t.dat
  [1,16,0,24,0,10,0,0,0,-24,0,0,0,10, ldraw_lib__box4t()],
// 1 16 0 0 0 0 0 1 0 1 0 -1 0 0 stud.dat
  [1,16,0,0,0,0,0,1,0,1,0,-1,0,0, ldraw_lib__stud()],
// 0
];
module ldraw_lib__s__3005s01(step=0, col=false, unit=2/5, alt=false, line=0.2, solid=!$preview)
    makepoly(ldraw_lib__s__3005s01(), step=step, col=col, unit=unit, alt=alt, line=line, solid=solid);
ldraw_lib__s__3005s01(line=0.2);
// main file
use <../lib.scad>
use <s/3005p07s01.scad>
use <s/3005s01.scad>
function ldraw_lib__3005p07() = [
// 0 Brick  1 x  1 with Silver Arched Window with Dark Brown Lattice and Dark Tan Arches Pattern
// 0 Name: 3005p07.dat
// 0 Author: Philippe Hurbain [Philo]
// 0 !LDRAW_ORG Part UPDATE 2025-07
// 0 !LICENSE Licensed under CC BY 4.0 : see CAreadme.txt
// 
// 0 BFC CERTIFY CCW
  [0,"BFC","CERTIFY"],
  [0,"BFC","CCW"],
// 
// 0 !KEYWORDS Bricklink 3005pb063, Castle, Harry Potter, Hogwarts, HP, Miniature
// 0 !KEYWORDS Rebrickable 3005pr0038, Set 76419, Wizarding World
// 
// 0 !HISTORY 2025-07-27 [OrionP] Official Update 2025-07
// 
// 1 16 0 0 0 1 0 0 0 1 0 0 0 1 s\3005s01.dat
  [1,16,0,0,0,1,0,0,0,1,0,0,0,1, ldraw_lib__s__3005s01()],
// 1 16 0 0 0 1 0 0 0 1 0 0 0 1 s\3005p07s01.dat
  [1,16,0,0,0,1,0,0,0,1,0,0,0,1, ldraw_lib__s__3005p07s01()],
// 1 16 0 0 0 -1 0 0 0 1 0 0 0 1 s\3005p07s01.dat
  [1,16,0,0,0,-1,0,0,0,1,0,0,0,1, ldraw_lib__s__3005p07s01()],
// 4 28 9.74 22.36 -10 4.57 21.64 -10 -4.57 21.64 -10 -9.74 22.36 -10
  [4,28,9.74,22.36,-10,4.57,21.64,-10,-4.57,21.64,-10,-9.74,22.36,-10],
// 4 16 9.74 22.36 -10 -9.74 22.36 -10 -10 24 -10 10 24 -10
  [4,16,9.74,22.36,-10,-9.74,22.36,-10,-10,24,-10,10,24,-10],
// 3 16 0 0.35 -10 10 0 -10 -10 0 -10
  [3,16,0,0.35,-10,10,0,-10,-10,0,-10],
// 3 308 0 20.86 -10 -0.396 20.97 -10 0.396 20.97 -10
  [3,308,0,20.86,-10,-0.396,20.97,-10,0.396,20.97,-10],
// 4 308 4.57 21.64 -10 0.396 20.97 -10 -0.396 20.97 -10 -4.57 21.64 -10
  [4,308,4.57,21.64,-10,0.396,20.97,-10,-0.396,20.97,-10,-4.57,21.64,-10],
];
module ldraw_lib__3005p07(step=0, col=false, unit=2/5, alt=false, line=0.2, solid=!$preview)
    makepoly(ldraw_lib__3005p07(), step=step, col=col, unit=unit, alt=alt, line=line, solid=solid);
ldraw_lib__3005p07(line=0.2);
